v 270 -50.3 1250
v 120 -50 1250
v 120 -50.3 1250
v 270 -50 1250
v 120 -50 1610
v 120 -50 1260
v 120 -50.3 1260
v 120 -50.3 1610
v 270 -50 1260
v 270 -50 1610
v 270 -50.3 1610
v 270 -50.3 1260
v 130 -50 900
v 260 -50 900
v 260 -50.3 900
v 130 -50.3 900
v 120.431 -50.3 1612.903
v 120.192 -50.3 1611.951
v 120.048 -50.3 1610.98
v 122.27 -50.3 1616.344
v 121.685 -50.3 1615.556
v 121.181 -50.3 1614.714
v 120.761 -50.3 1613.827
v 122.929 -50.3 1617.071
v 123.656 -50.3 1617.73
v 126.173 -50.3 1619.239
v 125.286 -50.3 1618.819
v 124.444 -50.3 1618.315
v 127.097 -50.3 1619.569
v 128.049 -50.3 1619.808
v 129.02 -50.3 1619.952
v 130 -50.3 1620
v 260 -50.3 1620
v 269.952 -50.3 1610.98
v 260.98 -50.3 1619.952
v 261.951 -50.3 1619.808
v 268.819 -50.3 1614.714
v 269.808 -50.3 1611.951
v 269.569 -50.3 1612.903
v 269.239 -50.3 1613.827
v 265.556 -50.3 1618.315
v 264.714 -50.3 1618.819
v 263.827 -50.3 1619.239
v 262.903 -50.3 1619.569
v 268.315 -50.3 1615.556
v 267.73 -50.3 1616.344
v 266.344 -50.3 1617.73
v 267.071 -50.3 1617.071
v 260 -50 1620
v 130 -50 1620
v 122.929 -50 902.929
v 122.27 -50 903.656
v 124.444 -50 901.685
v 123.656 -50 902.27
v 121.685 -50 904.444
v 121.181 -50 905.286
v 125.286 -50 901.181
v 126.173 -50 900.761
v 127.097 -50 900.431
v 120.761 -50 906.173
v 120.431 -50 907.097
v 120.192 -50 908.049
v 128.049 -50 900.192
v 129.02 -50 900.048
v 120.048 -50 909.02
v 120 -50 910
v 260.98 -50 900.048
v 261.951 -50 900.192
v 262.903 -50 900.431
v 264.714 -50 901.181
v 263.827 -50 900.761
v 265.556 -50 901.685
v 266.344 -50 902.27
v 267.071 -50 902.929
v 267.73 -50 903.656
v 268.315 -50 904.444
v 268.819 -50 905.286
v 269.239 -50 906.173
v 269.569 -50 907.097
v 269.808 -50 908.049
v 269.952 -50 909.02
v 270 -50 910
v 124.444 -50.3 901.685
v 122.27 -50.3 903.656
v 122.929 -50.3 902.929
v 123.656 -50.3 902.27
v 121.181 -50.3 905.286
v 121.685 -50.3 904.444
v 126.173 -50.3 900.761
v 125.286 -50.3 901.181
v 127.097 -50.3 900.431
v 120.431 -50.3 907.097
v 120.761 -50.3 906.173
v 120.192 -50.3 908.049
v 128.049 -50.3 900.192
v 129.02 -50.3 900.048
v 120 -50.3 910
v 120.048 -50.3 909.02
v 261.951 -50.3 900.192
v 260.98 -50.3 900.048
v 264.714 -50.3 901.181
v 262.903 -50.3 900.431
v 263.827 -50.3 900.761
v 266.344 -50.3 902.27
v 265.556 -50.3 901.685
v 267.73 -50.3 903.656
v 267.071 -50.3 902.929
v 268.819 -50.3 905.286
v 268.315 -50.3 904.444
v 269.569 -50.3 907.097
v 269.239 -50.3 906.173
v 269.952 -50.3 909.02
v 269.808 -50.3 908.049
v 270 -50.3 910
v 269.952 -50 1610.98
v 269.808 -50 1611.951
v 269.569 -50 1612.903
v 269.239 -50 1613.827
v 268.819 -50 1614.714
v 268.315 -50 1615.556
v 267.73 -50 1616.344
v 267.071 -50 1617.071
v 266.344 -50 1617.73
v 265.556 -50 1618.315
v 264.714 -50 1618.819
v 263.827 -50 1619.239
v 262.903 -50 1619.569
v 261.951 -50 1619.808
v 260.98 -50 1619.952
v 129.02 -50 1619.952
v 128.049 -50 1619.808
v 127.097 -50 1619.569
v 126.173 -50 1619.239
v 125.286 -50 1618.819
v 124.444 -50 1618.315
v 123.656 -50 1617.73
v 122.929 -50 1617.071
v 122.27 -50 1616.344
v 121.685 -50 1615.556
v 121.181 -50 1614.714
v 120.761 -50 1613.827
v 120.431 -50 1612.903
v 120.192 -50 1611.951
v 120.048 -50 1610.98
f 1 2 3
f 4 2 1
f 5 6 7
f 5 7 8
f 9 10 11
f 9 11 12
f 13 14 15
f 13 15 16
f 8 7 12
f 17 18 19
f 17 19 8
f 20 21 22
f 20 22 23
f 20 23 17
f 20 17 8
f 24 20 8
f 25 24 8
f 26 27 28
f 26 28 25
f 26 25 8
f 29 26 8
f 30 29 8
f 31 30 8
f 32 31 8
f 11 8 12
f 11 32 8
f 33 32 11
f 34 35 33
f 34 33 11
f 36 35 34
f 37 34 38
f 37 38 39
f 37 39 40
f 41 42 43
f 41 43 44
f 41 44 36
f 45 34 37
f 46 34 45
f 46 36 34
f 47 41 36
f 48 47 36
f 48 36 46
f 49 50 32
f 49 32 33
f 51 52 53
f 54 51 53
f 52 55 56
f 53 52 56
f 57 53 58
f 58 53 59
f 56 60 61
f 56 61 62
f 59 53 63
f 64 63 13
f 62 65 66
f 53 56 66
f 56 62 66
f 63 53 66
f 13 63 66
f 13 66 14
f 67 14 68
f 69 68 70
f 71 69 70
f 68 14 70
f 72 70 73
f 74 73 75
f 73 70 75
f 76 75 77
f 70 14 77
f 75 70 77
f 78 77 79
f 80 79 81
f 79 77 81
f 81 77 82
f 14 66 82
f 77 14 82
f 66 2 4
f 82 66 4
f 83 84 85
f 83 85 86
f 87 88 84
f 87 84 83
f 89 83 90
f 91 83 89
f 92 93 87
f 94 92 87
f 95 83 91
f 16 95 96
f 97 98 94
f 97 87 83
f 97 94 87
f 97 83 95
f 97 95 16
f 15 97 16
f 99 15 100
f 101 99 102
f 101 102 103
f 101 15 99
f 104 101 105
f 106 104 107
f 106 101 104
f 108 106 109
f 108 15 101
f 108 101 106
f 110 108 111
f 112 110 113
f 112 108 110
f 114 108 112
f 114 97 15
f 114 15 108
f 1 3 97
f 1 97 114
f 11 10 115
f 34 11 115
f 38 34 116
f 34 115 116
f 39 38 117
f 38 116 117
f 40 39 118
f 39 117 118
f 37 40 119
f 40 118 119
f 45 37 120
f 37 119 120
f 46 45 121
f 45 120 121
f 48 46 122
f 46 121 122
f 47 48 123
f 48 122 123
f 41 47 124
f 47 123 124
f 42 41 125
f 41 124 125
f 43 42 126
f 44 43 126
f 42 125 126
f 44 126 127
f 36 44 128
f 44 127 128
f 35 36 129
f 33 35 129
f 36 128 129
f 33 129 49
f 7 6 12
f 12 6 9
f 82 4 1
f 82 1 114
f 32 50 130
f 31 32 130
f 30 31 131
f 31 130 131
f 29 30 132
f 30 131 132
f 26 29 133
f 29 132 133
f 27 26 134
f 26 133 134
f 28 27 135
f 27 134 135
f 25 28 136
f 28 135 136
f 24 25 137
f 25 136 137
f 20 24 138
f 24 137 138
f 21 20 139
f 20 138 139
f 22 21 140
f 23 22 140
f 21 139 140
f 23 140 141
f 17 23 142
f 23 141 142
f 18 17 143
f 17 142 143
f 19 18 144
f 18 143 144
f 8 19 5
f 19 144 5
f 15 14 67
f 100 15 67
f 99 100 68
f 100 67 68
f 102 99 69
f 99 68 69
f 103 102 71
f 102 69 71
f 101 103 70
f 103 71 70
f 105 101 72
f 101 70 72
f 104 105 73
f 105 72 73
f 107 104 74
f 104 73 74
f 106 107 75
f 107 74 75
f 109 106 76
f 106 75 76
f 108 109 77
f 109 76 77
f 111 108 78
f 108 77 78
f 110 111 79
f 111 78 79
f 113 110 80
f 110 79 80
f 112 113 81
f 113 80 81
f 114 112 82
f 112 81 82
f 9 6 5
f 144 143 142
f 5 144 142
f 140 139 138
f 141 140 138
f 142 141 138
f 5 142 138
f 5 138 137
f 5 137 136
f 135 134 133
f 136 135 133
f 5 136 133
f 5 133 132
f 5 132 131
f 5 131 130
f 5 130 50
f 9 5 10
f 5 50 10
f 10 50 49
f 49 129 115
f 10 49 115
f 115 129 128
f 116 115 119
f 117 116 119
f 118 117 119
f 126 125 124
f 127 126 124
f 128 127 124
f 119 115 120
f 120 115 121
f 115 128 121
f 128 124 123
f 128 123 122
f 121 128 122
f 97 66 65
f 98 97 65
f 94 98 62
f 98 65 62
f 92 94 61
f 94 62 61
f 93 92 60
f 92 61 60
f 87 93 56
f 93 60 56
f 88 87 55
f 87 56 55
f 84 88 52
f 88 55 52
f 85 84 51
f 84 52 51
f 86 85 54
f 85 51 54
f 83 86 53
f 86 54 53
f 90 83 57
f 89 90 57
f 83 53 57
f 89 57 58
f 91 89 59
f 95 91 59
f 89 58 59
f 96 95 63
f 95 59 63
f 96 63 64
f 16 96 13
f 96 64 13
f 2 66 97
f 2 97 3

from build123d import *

# Parameters (mm, degrees)
RECTANGLE_W      = 1217.787964
RECTANGLE_H      = 10
EXTRUDE008_DEPTH = 150
EXTRUDE007_DEPTH = 0.3


with BuildPart() as extrude008:
    # Rectangle → Extrude008 (new body)
    with BuildSketch(Plane.XZ):
        with Locations((608.893982, 5)):
            Rectangle(RECTANGLE_W, RECTANGLE_H)
    extrude(amount=EXTRUDE008_DEPTH)


with BuildPart() as extrude008_1:
    # Extrude008 placement: moved
    add(extrude008.part.moved(Location((0, 0, 1250))))


with BuildPart() as cut:
    # Sketch007 → Extrude007 (new body)
    with BuildSketch(Plane.XZ):
        with BuildLine():
            ThreePointArc((10, 720), (2.928932, 717.071068), (0, 710))
            Line((0, 10), (0, 710))
            ThreePointArc((0, 10), (2.928932, 2.928932), (10, 0))
            Line((140, 0), (10, 0))
            ThreePointArc((140, 0), (147.071068, 2.928932), (150, 10))
            Line((150, 710), (150, 10))
            ThreePointArc((150, 710), (147.071068, 717.071068), (140, 720))
            Line((10, 720), (140, 720))
        make_face()
    extrude(amount=EXTRUDE007_DEPTH)


with BuildPart() as cut_1:
    # Extrude007 placement: moved
    add(cut.part.moved(Location((120, -50, 900))))

    # Cut: cut Extrude008
    add(extrude008_1.part, mode=Mode.SUBTRACT)


solid = cut_1.part
